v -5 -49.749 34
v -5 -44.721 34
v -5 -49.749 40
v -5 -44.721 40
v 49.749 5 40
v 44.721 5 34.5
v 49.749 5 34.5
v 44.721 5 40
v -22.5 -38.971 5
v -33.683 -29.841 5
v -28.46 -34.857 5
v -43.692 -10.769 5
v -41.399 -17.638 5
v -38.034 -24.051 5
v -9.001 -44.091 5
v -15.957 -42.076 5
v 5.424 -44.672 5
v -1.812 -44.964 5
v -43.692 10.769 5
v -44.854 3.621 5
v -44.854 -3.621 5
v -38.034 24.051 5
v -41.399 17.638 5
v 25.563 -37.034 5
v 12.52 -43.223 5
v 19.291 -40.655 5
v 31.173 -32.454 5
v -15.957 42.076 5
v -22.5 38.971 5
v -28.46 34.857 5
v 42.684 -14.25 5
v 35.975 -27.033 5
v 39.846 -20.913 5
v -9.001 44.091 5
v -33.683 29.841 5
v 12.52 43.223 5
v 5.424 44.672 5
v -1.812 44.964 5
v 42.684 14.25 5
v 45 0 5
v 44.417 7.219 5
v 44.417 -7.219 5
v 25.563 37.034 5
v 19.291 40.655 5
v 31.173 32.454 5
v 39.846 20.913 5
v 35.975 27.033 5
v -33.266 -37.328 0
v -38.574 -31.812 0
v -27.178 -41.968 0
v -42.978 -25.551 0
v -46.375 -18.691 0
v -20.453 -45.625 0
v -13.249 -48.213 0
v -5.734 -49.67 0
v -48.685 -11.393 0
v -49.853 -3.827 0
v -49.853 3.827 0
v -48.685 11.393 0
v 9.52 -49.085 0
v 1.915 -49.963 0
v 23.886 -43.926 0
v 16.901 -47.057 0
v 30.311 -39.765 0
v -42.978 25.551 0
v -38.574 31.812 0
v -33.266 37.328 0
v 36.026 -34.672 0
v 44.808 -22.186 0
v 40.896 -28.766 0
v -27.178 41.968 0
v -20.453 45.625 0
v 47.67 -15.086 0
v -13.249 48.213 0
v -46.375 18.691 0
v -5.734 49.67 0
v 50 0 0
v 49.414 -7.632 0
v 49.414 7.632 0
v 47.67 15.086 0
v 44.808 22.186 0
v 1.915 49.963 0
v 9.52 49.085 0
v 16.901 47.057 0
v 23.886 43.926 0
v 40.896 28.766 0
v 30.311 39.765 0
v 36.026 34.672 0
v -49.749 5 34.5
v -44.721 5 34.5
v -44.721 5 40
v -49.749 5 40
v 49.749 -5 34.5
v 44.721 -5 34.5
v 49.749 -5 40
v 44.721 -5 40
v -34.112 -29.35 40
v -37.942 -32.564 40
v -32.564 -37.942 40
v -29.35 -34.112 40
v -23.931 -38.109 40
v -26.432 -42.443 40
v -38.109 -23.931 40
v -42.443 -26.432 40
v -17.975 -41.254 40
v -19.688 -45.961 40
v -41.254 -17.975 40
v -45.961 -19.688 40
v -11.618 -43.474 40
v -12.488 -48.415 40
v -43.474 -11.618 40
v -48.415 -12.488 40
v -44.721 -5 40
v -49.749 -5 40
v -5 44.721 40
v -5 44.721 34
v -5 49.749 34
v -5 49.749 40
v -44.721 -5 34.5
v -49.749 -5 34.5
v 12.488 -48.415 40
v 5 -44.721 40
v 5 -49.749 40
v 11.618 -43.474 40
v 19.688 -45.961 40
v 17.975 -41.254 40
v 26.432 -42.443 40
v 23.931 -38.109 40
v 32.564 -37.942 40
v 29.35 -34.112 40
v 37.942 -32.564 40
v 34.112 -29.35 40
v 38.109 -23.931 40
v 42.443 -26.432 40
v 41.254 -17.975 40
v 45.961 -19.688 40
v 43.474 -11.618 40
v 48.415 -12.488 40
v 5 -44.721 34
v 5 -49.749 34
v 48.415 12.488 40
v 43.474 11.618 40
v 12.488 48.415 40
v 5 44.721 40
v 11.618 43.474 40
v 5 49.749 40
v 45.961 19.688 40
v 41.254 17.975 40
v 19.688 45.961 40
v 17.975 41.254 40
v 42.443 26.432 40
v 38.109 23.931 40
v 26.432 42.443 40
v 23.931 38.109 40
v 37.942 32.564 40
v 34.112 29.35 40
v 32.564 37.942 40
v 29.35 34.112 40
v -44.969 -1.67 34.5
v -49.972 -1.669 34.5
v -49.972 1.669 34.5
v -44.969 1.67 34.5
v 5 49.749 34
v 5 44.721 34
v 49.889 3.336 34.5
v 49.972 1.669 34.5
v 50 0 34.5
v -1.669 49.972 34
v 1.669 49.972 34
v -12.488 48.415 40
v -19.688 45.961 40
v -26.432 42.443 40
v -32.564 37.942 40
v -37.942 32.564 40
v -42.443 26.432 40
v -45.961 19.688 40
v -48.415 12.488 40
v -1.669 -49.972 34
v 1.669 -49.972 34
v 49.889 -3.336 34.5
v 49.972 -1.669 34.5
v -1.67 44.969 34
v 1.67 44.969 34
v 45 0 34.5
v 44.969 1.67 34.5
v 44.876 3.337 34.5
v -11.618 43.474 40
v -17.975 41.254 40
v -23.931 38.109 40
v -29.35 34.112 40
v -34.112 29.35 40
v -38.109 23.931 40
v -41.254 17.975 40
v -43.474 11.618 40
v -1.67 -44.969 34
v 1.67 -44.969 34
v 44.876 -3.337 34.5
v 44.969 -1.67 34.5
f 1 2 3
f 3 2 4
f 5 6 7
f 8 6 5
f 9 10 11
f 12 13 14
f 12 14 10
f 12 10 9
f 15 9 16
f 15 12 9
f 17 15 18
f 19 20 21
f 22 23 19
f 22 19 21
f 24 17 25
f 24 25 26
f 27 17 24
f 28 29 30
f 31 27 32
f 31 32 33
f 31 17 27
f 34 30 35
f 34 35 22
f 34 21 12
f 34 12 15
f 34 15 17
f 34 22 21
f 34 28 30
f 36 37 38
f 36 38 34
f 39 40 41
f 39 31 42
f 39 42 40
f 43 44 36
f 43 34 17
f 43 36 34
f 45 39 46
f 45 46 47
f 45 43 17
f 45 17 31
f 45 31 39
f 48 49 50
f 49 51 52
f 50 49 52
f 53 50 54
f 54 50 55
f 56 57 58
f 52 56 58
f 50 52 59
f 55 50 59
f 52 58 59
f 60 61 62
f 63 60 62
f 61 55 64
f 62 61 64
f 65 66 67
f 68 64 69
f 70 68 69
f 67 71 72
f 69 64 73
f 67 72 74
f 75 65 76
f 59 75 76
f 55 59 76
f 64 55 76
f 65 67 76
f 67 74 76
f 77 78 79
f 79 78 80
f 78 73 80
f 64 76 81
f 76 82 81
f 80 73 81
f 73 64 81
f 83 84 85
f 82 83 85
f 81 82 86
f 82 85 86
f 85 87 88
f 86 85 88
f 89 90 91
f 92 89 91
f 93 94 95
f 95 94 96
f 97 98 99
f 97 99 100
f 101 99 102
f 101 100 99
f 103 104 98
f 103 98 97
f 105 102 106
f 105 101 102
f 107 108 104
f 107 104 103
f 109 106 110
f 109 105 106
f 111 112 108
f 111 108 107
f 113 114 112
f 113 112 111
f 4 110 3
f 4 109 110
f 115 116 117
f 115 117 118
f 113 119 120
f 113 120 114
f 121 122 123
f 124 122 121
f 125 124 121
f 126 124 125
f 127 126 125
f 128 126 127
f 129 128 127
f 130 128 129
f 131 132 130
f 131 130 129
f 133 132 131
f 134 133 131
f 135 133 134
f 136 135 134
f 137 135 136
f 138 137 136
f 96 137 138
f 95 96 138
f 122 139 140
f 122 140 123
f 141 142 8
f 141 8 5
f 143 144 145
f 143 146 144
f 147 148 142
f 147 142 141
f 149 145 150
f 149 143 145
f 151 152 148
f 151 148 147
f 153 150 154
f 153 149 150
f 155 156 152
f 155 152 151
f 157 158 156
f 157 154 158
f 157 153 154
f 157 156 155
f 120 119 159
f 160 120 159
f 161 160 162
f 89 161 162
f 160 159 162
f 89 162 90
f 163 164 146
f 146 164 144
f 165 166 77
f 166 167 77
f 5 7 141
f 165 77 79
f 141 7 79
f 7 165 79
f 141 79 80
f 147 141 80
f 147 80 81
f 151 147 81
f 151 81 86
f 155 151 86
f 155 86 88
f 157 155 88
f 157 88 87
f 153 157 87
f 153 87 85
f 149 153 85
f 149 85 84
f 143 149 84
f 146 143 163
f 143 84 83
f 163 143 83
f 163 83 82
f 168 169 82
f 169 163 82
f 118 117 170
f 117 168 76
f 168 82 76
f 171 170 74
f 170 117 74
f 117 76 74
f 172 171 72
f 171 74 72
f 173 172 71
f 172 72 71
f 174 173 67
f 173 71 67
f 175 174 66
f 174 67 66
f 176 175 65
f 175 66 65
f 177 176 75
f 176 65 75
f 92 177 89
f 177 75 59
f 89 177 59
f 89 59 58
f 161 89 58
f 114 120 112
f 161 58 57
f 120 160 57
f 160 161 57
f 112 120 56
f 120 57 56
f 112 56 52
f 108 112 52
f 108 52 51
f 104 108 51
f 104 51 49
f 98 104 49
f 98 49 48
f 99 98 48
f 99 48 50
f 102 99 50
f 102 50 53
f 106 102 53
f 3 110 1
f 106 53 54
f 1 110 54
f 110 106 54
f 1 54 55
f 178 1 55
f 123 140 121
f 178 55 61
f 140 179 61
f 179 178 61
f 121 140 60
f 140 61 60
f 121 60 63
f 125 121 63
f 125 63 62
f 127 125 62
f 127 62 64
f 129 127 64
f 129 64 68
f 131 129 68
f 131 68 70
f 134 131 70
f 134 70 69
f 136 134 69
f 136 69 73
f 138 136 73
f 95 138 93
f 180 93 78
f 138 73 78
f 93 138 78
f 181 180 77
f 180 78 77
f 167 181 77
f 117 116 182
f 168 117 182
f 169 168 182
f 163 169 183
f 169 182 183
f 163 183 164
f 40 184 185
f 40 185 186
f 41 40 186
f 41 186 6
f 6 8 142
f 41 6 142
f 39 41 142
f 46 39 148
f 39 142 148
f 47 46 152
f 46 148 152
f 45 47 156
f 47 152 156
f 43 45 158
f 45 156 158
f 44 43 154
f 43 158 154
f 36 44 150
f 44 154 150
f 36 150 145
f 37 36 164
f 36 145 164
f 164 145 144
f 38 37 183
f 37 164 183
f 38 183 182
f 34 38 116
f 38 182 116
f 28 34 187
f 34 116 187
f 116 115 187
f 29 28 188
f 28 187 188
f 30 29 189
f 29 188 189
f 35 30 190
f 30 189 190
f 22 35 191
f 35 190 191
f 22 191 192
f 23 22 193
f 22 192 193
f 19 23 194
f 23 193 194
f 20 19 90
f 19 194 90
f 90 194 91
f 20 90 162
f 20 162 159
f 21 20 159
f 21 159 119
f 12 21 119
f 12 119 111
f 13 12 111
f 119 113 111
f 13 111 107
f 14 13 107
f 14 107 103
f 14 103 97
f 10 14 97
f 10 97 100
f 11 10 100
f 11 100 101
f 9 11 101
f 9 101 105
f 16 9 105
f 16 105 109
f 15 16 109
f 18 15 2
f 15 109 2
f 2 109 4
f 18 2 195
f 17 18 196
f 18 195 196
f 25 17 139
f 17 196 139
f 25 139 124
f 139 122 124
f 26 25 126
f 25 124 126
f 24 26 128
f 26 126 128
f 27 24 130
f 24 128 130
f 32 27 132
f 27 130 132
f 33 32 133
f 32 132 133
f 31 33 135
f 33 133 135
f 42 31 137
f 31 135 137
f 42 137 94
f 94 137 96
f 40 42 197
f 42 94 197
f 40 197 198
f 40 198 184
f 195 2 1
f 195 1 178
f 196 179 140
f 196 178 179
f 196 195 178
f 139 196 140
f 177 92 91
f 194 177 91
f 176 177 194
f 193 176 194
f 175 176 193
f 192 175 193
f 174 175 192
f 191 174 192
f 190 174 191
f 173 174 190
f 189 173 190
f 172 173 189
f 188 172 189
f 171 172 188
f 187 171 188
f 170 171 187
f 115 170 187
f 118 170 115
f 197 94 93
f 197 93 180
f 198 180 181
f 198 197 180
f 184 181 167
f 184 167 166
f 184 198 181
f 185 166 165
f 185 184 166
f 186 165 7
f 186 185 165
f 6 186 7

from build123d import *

# Parameters (mm, degrees)
F0_R      = 50
F1_DEPTH  = 40
F2_R      = 45
F3_DEPTH  = 35
F4_W      = 10
F4_H      = 6
F5_DEPTH  = 50
F6_W      = 10
F6_H      = 6
F7_DEPTH  = 50
F8_W      = 10
F8_H      = 5.49967
F9_DEPTH  = 50
F10_W     = 10
F10_H     = 5.49967
F11_DEPTH = 50


with BuildPart() as f1:
    # F0 (on Top) → F1 (new body)
    with BuildSketch(Plane.XY):
        Circle(F0_R)
    extrude(amount=F1_DEPTH)

    # F2 (on face) → F3 (cut)
    with BuildSketch(Plane.XY.offset(40)):
        Circle(F2_R)
    extrude(amount=-F3_DEPTH, mode=Mode.SUBTRACT)

    # F4 (on Front) → F5 (cut)
    with BuildSketch(Plane.XZ):
        with Locations((0, 37)):
            Rectangle(F4_W, F4_H)
    extrude(amount=-F5_DEPTH, mode=Mode.SUBTRACT)

    # F6 (on Front) → F7 (cut)
    with BuildSketch(Plane.XZ):
        with Locations((0, 37)):
            Rectangle(F6_W, F6_H)
    extrude(amount=F7_DEPTH, mode=Mode.SUBTRACT)

    # F8 (on Right) → F9 (cut)
    with BuildSketch(Plane.YZ):
        with Locations((0, 37.250165)):
            Rectangle(F8_W, F8_H)
    extrude(amount=-F9_DEPTH, mode=Mode.SUBTRACT)

    # F10 (on Right) → F11 (cut)
    with BuildSketch(Plane.YZ):
        with Locations((0, 37.250165)):
            Rectangle(F10_W, F10_H)
    extrude(amount=F11_DEPTH, mode=Mode.SUBTRACT)


solid = f1.part
